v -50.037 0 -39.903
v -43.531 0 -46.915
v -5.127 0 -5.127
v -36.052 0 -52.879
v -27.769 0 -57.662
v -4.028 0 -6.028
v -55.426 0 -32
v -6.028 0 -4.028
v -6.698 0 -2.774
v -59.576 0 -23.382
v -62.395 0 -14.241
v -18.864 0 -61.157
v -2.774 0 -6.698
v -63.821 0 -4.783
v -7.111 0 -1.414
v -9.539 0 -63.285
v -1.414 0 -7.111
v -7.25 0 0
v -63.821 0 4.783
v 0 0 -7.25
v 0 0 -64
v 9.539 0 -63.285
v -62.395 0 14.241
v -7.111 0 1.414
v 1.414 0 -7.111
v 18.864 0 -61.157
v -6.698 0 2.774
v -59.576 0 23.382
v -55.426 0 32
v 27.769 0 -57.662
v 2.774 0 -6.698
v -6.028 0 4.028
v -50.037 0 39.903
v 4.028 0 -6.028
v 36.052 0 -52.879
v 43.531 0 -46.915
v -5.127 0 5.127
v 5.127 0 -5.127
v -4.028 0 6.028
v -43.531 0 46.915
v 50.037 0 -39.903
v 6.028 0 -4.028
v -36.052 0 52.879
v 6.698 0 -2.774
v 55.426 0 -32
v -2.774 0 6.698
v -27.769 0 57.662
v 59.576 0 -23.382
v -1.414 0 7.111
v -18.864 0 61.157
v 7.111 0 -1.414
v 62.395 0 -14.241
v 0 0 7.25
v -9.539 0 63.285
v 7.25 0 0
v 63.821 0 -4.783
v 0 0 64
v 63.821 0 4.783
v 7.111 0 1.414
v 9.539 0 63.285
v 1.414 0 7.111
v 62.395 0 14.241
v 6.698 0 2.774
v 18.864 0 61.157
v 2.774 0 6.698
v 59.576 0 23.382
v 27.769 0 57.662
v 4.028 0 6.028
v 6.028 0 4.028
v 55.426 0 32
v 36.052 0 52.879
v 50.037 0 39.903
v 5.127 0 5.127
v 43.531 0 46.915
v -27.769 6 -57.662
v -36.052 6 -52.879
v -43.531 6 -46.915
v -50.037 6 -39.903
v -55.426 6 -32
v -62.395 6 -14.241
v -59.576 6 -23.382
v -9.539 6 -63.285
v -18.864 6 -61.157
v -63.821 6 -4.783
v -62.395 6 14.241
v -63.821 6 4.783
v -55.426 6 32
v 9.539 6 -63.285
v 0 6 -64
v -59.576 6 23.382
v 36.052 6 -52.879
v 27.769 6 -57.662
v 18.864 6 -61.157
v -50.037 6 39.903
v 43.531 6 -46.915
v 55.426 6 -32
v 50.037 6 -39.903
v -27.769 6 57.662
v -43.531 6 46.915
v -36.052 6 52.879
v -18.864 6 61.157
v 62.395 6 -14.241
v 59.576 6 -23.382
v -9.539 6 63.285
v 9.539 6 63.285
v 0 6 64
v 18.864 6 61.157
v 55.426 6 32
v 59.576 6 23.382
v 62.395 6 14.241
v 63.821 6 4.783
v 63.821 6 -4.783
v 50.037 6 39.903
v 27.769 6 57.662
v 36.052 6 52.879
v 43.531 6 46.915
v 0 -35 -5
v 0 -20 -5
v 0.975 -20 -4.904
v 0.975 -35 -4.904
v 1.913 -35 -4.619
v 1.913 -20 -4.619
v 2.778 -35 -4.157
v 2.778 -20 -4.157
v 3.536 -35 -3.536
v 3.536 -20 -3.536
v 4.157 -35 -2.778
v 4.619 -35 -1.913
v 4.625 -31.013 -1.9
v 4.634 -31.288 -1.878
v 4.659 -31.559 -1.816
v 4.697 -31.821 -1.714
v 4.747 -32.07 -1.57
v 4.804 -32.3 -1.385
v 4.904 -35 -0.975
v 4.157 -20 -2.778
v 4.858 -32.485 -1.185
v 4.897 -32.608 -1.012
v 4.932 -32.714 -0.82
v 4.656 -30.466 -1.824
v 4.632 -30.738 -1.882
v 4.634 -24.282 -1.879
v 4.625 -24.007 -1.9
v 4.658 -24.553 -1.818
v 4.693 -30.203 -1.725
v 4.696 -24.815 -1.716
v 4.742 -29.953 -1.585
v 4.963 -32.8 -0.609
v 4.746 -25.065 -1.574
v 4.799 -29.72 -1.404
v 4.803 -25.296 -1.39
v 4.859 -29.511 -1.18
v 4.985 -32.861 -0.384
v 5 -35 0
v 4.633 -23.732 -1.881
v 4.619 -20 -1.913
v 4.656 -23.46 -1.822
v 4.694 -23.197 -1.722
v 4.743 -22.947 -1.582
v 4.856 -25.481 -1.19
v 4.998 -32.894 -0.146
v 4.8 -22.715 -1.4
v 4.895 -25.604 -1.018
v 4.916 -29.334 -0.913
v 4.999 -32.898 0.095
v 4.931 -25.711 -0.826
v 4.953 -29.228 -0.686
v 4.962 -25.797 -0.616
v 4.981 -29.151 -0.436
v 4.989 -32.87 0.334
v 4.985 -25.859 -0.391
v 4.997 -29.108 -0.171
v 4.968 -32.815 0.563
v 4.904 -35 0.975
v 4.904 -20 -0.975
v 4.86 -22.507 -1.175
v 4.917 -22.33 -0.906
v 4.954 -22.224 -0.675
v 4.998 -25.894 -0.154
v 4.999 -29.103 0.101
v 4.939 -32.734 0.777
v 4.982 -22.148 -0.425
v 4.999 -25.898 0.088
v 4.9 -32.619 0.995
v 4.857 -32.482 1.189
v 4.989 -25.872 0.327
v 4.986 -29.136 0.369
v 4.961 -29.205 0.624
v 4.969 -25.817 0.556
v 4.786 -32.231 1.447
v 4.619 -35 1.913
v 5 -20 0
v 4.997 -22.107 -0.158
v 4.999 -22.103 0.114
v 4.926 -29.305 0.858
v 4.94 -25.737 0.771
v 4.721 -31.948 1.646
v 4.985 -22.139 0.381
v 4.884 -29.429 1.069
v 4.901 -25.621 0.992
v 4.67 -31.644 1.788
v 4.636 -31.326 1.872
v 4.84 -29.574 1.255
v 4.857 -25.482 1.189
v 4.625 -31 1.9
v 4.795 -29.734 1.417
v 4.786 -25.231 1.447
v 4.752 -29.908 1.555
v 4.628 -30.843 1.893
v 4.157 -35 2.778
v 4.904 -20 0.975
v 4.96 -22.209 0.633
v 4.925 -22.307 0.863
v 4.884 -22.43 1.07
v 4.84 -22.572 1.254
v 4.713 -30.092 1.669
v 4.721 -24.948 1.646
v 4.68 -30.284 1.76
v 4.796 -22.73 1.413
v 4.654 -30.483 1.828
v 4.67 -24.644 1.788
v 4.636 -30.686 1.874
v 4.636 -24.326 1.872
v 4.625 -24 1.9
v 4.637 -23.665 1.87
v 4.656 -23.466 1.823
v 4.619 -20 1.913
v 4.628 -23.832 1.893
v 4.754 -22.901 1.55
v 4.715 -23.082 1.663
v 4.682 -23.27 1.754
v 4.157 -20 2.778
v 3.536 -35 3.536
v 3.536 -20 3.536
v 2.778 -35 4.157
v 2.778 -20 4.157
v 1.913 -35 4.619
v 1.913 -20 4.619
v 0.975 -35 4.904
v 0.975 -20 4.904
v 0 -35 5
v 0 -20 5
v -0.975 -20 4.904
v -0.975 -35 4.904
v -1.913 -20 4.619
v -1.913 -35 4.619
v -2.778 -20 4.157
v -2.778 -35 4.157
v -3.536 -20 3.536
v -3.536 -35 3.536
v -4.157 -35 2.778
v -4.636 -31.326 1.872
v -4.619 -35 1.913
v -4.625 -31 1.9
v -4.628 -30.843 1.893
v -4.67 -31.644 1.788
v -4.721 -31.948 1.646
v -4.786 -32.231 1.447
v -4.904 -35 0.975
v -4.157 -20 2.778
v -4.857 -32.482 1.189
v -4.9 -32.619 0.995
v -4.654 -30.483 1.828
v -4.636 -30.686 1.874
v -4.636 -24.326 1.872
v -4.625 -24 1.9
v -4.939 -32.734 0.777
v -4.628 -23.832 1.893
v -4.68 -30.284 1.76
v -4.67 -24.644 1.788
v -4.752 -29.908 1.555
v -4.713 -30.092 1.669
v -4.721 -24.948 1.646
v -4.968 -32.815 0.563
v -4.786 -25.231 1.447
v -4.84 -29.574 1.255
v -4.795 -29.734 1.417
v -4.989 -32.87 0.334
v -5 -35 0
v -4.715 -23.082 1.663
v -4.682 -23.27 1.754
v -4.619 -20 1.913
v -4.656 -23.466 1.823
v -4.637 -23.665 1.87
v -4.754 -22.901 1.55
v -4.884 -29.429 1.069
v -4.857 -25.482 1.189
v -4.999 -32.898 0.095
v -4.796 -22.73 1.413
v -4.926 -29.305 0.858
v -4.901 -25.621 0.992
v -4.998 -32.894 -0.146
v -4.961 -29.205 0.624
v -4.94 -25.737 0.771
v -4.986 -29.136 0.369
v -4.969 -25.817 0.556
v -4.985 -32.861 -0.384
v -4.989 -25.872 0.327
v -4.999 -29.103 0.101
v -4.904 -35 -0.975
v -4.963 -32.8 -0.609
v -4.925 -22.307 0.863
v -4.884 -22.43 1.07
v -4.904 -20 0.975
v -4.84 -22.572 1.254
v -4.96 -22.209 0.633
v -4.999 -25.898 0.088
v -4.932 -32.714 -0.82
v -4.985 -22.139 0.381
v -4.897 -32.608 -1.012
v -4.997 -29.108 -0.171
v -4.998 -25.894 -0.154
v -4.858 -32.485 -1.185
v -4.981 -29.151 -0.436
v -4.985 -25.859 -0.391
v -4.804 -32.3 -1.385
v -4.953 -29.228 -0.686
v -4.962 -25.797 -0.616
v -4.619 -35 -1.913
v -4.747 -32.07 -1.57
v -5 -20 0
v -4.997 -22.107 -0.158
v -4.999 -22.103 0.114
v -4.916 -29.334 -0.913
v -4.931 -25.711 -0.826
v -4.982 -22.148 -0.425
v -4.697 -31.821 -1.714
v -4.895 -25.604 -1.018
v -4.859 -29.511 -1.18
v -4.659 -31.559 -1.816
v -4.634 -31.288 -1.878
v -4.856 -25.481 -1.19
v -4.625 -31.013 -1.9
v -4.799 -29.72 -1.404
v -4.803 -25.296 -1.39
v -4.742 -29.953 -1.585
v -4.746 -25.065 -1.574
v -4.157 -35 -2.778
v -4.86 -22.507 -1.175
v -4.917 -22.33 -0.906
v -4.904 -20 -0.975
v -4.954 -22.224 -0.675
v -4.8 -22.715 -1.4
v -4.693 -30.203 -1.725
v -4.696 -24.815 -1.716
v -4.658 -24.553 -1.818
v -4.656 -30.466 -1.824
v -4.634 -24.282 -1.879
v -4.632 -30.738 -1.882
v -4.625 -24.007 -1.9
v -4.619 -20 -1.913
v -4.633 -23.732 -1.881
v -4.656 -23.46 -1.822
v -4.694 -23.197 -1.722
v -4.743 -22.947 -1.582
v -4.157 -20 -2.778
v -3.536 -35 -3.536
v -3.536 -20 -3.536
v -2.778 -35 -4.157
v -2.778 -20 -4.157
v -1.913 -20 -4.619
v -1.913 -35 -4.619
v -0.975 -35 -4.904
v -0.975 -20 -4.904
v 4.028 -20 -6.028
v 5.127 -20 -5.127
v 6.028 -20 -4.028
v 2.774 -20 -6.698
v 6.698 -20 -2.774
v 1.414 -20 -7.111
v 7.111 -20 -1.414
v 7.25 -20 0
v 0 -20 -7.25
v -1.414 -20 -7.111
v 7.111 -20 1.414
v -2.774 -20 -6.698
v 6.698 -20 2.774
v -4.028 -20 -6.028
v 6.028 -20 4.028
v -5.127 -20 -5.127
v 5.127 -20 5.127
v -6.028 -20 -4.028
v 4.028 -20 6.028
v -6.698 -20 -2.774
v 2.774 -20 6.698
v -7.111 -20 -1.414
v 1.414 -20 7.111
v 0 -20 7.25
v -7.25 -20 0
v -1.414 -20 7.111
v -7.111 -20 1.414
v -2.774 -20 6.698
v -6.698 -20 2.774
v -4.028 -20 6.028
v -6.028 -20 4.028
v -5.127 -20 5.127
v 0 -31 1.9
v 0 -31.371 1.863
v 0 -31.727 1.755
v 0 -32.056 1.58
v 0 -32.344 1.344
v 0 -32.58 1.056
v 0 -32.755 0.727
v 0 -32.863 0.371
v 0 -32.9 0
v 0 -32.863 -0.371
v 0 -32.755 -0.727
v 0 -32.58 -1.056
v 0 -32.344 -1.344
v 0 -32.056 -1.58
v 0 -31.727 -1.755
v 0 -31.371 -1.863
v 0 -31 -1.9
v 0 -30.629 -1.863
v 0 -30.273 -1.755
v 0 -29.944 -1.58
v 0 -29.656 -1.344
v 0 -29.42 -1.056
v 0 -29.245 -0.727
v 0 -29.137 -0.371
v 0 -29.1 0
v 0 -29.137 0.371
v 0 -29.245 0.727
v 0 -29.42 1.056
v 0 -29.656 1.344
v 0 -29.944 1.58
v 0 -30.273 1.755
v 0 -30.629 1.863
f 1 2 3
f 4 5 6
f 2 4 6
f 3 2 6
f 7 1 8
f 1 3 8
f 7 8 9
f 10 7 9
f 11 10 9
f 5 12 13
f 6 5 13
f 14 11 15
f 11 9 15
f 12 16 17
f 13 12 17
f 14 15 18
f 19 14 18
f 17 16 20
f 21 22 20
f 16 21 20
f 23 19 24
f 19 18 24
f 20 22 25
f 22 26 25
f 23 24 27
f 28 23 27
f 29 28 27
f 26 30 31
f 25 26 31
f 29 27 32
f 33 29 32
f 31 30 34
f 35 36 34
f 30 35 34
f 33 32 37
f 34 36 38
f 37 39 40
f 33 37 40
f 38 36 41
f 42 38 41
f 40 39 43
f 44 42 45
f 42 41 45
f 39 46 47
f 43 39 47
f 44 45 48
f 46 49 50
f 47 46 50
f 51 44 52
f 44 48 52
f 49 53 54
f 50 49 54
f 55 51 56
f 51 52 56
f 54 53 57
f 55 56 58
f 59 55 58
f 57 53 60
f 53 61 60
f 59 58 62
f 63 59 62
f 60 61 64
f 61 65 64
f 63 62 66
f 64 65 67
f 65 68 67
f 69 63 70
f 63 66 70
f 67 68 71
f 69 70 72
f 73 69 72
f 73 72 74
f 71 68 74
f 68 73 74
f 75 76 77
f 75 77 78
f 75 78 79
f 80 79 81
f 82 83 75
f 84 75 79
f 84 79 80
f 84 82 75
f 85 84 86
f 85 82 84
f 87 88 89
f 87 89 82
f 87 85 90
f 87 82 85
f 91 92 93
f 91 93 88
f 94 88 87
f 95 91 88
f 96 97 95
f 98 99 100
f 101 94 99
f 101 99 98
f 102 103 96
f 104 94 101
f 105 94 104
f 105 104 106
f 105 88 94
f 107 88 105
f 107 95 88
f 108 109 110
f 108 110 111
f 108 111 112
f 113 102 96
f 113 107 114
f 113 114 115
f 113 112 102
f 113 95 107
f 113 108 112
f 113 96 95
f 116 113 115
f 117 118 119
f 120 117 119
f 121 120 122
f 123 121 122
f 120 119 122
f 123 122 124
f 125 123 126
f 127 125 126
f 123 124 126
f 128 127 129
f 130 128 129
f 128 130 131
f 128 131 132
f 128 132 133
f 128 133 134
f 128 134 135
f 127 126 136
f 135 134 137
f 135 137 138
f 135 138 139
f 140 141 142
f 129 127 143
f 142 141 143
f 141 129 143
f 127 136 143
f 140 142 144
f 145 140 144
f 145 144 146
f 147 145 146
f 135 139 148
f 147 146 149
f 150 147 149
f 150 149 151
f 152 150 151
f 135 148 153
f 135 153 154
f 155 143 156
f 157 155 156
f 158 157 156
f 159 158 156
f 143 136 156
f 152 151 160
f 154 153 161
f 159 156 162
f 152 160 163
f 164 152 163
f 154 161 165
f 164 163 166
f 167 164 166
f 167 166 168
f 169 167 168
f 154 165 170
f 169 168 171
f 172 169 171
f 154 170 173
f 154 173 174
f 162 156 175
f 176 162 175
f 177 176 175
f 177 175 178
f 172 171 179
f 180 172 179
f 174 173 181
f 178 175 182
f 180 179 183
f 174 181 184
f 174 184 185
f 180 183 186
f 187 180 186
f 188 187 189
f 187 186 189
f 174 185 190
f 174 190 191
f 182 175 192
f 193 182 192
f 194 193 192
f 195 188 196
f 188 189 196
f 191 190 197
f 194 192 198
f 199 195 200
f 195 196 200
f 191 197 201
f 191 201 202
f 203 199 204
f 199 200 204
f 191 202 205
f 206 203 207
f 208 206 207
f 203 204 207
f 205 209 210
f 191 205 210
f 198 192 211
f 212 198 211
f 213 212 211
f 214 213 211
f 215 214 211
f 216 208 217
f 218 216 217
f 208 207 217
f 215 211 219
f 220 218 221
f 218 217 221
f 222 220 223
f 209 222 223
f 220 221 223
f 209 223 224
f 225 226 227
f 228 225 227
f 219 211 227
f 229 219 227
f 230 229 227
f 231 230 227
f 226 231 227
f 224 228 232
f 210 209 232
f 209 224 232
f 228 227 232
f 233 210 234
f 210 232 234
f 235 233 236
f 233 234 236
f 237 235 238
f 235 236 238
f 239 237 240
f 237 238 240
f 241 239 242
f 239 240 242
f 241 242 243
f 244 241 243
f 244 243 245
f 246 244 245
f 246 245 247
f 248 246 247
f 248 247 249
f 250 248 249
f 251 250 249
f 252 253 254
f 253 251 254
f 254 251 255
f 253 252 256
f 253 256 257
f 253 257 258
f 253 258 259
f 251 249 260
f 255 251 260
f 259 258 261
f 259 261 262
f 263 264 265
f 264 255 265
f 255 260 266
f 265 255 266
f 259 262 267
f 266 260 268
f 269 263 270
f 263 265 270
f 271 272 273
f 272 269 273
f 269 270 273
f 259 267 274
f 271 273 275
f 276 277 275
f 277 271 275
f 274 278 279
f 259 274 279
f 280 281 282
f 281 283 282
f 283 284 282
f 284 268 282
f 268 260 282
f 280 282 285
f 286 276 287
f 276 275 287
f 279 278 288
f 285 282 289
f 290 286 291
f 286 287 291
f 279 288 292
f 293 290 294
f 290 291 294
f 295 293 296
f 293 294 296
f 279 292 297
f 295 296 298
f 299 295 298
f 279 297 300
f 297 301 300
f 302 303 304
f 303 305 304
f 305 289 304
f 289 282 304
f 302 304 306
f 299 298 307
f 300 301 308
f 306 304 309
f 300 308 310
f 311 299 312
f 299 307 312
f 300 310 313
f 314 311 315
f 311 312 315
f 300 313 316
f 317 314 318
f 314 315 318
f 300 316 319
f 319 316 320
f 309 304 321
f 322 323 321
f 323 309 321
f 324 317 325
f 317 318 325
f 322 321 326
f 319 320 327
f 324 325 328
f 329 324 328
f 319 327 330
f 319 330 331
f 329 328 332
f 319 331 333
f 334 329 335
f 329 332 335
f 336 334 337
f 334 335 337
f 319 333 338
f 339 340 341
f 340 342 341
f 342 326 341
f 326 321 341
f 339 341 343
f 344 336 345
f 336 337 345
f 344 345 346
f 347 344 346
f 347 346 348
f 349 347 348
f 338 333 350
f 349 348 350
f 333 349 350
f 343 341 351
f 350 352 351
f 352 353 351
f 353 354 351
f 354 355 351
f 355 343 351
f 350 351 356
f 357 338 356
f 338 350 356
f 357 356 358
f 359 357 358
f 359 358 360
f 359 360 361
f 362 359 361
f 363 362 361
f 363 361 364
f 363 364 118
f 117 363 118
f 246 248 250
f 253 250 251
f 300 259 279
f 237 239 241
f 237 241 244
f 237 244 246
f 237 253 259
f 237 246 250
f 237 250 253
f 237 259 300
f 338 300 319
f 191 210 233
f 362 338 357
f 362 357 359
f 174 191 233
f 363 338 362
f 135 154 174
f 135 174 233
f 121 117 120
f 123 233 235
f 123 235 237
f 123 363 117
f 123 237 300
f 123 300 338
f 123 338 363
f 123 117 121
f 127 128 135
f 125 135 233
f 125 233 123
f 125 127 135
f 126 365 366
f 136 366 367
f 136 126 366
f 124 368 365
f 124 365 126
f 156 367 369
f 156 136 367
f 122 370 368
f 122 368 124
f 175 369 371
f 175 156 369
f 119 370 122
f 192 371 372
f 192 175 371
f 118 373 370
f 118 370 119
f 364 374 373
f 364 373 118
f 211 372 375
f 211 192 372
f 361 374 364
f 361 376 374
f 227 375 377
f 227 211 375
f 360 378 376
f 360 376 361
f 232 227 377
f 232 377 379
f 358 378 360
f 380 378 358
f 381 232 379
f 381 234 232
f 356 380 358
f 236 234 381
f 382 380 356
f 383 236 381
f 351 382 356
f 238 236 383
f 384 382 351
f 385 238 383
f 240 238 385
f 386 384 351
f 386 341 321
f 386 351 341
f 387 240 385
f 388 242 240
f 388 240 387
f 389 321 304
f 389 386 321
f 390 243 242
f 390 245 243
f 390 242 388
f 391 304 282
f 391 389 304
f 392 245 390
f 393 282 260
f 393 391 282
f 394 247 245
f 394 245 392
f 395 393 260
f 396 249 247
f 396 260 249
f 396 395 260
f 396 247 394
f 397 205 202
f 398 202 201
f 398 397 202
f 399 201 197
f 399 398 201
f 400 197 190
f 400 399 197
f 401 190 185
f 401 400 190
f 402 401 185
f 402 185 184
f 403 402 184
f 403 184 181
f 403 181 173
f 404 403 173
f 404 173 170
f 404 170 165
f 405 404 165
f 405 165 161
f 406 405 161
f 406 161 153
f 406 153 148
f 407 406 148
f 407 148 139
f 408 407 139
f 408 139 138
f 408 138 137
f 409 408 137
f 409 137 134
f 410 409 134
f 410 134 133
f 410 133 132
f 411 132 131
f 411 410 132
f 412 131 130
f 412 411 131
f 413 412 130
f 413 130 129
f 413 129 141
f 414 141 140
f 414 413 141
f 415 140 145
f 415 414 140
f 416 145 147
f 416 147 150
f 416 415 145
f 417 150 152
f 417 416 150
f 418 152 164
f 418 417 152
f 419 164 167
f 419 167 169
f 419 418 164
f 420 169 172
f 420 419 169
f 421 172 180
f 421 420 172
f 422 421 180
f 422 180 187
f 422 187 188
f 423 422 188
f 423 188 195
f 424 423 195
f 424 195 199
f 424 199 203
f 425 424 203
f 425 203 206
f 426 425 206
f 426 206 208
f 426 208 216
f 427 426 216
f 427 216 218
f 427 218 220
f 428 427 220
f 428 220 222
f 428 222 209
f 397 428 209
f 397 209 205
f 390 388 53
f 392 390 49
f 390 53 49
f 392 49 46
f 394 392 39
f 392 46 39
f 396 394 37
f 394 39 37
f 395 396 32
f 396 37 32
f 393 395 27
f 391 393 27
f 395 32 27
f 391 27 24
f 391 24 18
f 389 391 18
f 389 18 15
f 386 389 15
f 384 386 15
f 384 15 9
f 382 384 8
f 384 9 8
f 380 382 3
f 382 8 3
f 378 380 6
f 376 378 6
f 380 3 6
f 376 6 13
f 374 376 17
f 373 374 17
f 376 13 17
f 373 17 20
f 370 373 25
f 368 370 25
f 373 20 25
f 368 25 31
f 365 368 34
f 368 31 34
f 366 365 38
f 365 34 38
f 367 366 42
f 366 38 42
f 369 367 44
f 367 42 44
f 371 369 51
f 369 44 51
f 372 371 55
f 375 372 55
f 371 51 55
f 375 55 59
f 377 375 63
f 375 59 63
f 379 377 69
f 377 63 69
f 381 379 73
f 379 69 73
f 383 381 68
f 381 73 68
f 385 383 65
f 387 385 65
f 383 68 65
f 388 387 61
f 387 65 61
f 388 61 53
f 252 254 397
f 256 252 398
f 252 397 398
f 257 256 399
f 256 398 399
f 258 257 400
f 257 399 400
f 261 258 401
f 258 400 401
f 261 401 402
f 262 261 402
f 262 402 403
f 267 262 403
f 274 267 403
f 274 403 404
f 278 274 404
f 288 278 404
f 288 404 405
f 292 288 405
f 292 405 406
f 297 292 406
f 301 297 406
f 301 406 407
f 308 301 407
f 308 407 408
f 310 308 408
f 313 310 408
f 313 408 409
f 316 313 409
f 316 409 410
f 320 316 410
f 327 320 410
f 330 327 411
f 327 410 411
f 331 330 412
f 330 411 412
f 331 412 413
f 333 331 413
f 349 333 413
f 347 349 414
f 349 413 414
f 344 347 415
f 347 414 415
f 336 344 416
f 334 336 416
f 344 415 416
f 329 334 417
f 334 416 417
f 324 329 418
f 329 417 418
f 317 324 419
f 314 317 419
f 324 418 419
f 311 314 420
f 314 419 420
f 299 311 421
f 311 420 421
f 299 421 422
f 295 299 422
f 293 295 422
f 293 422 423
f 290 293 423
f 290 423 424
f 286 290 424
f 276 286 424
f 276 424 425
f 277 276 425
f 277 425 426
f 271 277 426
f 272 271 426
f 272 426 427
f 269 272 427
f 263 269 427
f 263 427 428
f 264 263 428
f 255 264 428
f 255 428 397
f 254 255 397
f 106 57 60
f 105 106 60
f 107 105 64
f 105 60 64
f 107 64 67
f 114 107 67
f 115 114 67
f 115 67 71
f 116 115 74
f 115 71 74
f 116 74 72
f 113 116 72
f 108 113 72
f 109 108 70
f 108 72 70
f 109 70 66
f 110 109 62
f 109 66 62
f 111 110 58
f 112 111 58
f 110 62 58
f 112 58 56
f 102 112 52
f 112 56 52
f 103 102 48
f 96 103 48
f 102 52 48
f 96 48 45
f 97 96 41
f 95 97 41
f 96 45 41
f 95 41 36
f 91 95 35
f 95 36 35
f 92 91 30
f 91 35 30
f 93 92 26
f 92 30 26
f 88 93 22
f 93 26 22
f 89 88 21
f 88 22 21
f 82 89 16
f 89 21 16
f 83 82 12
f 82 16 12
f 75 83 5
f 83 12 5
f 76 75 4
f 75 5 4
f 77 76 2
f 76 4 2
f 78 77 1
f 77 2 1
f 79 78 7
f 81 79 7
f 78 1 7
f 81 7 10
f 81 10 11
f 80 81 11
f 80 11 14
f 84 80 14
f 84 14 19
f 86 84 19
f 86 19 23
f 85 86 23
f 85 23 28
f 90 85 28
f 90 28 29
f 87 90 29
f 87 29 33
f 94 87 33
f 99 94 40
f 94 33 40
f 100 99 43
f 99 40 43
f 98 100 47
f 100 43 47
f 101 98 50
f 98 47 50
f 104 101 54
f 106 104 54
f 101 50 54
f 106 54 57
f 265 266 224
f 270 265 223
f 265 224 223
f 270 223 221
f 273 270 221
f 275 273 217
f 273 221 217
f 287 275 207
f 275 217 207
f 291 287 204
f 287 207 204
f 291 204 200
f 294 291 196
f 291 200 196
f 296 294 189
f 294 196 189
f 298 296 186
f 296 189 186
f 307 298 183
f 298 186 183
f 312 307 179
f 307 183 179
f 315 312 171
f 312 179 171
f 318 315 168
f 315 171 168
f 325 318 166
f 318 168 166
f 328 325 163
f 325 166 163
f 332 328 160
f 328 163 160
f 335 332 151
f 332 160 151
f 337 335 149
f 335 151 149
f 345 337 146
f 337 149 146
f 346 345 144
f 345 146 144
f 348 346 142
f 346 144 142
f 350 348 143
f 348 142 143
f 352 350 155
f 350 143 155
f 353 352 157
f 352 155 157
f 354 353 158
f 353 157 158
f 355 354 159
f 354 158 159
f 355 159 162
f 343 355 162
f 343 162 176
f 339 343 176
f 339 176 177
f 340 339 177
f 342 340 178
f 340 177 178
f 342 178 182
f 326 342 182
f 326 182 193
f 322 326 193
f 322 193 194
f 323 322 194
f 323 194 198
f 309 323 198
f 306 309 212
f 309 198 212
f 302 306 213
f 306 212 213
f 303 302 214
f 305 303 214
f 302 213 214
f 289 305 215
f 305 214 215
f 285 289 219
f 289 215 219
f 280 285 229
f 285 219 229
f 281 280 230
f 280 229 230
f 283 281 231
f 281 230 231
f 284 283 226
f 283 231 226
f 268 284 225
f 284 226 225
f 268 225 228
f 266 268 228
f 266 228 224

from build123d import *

# Parameters (mm, degrees)
SKETCH1_R           = 64
BOSS_EXTRUDE1_DEPTH = 6
SKETCH2_R           = 7.25
BOSS_EXTRUDE2_DEPTH = 20
SKETCH3_R           = 5
BOSS_EXTRUDE3_DEPTH = 15
SKETCH4_R           = 1.9
CUT_EXTRUDE1_DEPTH  = 10


with BuildPart() as part:
    # Sketch1 → Boss-Extrude1 (new body)
    with BuildSketch(Plane(origin=(0, 0, 0), x_dir=(1, 0, 0), z_dir=(0, 1, 0))):
        with Locations(Location((0, 0, 0), (0, 0, 270))):
            Circle(SKETCH1_R)
    extrude(amount=BOSS_EXTRUDE1_DEPTH)

    # Sketch2 → Boss-Extrude2 (add)
    with BuildSketch(Plane.XZ):
        with Locations(Location((0, 0, 0), (0, 0, 90))):
            Circle(SKETCH2_R)
    extrude(amount=BOSS_EXTRUDE2_DEPTH)

    # Sketch3 → Boss-Extrude3 (add)
    with BuildSketch(Plane.XZ.offset(20)):
        with Locations(Location((0, 0, 0), (0, 0, 270))):
            Circle(SKETCH3_R)
    extrude(amount=BOSS_EXTRUDE3_DEPTH)

    # Sketch4 → Cut-Extrude1 (cut, symmetric)
    with BuildSketch(Plane(origin=(0, 0, 0), x_dir=(0, 0, -1), z_dir=(1, 0, 0))):
        with Locations(Location((0, -31, 0), (0, 0, 180))):
            Circle(SKETCH4_R)
        with Locations(Location((0, -24, 0), (0, 0, 180))):
            Circle(SKETCH4_R)
    extrude(amount=CUT_EXTRUDE1_DEPTH, both=True, mode=Mode.SUBTRACT)


solid = part.part
